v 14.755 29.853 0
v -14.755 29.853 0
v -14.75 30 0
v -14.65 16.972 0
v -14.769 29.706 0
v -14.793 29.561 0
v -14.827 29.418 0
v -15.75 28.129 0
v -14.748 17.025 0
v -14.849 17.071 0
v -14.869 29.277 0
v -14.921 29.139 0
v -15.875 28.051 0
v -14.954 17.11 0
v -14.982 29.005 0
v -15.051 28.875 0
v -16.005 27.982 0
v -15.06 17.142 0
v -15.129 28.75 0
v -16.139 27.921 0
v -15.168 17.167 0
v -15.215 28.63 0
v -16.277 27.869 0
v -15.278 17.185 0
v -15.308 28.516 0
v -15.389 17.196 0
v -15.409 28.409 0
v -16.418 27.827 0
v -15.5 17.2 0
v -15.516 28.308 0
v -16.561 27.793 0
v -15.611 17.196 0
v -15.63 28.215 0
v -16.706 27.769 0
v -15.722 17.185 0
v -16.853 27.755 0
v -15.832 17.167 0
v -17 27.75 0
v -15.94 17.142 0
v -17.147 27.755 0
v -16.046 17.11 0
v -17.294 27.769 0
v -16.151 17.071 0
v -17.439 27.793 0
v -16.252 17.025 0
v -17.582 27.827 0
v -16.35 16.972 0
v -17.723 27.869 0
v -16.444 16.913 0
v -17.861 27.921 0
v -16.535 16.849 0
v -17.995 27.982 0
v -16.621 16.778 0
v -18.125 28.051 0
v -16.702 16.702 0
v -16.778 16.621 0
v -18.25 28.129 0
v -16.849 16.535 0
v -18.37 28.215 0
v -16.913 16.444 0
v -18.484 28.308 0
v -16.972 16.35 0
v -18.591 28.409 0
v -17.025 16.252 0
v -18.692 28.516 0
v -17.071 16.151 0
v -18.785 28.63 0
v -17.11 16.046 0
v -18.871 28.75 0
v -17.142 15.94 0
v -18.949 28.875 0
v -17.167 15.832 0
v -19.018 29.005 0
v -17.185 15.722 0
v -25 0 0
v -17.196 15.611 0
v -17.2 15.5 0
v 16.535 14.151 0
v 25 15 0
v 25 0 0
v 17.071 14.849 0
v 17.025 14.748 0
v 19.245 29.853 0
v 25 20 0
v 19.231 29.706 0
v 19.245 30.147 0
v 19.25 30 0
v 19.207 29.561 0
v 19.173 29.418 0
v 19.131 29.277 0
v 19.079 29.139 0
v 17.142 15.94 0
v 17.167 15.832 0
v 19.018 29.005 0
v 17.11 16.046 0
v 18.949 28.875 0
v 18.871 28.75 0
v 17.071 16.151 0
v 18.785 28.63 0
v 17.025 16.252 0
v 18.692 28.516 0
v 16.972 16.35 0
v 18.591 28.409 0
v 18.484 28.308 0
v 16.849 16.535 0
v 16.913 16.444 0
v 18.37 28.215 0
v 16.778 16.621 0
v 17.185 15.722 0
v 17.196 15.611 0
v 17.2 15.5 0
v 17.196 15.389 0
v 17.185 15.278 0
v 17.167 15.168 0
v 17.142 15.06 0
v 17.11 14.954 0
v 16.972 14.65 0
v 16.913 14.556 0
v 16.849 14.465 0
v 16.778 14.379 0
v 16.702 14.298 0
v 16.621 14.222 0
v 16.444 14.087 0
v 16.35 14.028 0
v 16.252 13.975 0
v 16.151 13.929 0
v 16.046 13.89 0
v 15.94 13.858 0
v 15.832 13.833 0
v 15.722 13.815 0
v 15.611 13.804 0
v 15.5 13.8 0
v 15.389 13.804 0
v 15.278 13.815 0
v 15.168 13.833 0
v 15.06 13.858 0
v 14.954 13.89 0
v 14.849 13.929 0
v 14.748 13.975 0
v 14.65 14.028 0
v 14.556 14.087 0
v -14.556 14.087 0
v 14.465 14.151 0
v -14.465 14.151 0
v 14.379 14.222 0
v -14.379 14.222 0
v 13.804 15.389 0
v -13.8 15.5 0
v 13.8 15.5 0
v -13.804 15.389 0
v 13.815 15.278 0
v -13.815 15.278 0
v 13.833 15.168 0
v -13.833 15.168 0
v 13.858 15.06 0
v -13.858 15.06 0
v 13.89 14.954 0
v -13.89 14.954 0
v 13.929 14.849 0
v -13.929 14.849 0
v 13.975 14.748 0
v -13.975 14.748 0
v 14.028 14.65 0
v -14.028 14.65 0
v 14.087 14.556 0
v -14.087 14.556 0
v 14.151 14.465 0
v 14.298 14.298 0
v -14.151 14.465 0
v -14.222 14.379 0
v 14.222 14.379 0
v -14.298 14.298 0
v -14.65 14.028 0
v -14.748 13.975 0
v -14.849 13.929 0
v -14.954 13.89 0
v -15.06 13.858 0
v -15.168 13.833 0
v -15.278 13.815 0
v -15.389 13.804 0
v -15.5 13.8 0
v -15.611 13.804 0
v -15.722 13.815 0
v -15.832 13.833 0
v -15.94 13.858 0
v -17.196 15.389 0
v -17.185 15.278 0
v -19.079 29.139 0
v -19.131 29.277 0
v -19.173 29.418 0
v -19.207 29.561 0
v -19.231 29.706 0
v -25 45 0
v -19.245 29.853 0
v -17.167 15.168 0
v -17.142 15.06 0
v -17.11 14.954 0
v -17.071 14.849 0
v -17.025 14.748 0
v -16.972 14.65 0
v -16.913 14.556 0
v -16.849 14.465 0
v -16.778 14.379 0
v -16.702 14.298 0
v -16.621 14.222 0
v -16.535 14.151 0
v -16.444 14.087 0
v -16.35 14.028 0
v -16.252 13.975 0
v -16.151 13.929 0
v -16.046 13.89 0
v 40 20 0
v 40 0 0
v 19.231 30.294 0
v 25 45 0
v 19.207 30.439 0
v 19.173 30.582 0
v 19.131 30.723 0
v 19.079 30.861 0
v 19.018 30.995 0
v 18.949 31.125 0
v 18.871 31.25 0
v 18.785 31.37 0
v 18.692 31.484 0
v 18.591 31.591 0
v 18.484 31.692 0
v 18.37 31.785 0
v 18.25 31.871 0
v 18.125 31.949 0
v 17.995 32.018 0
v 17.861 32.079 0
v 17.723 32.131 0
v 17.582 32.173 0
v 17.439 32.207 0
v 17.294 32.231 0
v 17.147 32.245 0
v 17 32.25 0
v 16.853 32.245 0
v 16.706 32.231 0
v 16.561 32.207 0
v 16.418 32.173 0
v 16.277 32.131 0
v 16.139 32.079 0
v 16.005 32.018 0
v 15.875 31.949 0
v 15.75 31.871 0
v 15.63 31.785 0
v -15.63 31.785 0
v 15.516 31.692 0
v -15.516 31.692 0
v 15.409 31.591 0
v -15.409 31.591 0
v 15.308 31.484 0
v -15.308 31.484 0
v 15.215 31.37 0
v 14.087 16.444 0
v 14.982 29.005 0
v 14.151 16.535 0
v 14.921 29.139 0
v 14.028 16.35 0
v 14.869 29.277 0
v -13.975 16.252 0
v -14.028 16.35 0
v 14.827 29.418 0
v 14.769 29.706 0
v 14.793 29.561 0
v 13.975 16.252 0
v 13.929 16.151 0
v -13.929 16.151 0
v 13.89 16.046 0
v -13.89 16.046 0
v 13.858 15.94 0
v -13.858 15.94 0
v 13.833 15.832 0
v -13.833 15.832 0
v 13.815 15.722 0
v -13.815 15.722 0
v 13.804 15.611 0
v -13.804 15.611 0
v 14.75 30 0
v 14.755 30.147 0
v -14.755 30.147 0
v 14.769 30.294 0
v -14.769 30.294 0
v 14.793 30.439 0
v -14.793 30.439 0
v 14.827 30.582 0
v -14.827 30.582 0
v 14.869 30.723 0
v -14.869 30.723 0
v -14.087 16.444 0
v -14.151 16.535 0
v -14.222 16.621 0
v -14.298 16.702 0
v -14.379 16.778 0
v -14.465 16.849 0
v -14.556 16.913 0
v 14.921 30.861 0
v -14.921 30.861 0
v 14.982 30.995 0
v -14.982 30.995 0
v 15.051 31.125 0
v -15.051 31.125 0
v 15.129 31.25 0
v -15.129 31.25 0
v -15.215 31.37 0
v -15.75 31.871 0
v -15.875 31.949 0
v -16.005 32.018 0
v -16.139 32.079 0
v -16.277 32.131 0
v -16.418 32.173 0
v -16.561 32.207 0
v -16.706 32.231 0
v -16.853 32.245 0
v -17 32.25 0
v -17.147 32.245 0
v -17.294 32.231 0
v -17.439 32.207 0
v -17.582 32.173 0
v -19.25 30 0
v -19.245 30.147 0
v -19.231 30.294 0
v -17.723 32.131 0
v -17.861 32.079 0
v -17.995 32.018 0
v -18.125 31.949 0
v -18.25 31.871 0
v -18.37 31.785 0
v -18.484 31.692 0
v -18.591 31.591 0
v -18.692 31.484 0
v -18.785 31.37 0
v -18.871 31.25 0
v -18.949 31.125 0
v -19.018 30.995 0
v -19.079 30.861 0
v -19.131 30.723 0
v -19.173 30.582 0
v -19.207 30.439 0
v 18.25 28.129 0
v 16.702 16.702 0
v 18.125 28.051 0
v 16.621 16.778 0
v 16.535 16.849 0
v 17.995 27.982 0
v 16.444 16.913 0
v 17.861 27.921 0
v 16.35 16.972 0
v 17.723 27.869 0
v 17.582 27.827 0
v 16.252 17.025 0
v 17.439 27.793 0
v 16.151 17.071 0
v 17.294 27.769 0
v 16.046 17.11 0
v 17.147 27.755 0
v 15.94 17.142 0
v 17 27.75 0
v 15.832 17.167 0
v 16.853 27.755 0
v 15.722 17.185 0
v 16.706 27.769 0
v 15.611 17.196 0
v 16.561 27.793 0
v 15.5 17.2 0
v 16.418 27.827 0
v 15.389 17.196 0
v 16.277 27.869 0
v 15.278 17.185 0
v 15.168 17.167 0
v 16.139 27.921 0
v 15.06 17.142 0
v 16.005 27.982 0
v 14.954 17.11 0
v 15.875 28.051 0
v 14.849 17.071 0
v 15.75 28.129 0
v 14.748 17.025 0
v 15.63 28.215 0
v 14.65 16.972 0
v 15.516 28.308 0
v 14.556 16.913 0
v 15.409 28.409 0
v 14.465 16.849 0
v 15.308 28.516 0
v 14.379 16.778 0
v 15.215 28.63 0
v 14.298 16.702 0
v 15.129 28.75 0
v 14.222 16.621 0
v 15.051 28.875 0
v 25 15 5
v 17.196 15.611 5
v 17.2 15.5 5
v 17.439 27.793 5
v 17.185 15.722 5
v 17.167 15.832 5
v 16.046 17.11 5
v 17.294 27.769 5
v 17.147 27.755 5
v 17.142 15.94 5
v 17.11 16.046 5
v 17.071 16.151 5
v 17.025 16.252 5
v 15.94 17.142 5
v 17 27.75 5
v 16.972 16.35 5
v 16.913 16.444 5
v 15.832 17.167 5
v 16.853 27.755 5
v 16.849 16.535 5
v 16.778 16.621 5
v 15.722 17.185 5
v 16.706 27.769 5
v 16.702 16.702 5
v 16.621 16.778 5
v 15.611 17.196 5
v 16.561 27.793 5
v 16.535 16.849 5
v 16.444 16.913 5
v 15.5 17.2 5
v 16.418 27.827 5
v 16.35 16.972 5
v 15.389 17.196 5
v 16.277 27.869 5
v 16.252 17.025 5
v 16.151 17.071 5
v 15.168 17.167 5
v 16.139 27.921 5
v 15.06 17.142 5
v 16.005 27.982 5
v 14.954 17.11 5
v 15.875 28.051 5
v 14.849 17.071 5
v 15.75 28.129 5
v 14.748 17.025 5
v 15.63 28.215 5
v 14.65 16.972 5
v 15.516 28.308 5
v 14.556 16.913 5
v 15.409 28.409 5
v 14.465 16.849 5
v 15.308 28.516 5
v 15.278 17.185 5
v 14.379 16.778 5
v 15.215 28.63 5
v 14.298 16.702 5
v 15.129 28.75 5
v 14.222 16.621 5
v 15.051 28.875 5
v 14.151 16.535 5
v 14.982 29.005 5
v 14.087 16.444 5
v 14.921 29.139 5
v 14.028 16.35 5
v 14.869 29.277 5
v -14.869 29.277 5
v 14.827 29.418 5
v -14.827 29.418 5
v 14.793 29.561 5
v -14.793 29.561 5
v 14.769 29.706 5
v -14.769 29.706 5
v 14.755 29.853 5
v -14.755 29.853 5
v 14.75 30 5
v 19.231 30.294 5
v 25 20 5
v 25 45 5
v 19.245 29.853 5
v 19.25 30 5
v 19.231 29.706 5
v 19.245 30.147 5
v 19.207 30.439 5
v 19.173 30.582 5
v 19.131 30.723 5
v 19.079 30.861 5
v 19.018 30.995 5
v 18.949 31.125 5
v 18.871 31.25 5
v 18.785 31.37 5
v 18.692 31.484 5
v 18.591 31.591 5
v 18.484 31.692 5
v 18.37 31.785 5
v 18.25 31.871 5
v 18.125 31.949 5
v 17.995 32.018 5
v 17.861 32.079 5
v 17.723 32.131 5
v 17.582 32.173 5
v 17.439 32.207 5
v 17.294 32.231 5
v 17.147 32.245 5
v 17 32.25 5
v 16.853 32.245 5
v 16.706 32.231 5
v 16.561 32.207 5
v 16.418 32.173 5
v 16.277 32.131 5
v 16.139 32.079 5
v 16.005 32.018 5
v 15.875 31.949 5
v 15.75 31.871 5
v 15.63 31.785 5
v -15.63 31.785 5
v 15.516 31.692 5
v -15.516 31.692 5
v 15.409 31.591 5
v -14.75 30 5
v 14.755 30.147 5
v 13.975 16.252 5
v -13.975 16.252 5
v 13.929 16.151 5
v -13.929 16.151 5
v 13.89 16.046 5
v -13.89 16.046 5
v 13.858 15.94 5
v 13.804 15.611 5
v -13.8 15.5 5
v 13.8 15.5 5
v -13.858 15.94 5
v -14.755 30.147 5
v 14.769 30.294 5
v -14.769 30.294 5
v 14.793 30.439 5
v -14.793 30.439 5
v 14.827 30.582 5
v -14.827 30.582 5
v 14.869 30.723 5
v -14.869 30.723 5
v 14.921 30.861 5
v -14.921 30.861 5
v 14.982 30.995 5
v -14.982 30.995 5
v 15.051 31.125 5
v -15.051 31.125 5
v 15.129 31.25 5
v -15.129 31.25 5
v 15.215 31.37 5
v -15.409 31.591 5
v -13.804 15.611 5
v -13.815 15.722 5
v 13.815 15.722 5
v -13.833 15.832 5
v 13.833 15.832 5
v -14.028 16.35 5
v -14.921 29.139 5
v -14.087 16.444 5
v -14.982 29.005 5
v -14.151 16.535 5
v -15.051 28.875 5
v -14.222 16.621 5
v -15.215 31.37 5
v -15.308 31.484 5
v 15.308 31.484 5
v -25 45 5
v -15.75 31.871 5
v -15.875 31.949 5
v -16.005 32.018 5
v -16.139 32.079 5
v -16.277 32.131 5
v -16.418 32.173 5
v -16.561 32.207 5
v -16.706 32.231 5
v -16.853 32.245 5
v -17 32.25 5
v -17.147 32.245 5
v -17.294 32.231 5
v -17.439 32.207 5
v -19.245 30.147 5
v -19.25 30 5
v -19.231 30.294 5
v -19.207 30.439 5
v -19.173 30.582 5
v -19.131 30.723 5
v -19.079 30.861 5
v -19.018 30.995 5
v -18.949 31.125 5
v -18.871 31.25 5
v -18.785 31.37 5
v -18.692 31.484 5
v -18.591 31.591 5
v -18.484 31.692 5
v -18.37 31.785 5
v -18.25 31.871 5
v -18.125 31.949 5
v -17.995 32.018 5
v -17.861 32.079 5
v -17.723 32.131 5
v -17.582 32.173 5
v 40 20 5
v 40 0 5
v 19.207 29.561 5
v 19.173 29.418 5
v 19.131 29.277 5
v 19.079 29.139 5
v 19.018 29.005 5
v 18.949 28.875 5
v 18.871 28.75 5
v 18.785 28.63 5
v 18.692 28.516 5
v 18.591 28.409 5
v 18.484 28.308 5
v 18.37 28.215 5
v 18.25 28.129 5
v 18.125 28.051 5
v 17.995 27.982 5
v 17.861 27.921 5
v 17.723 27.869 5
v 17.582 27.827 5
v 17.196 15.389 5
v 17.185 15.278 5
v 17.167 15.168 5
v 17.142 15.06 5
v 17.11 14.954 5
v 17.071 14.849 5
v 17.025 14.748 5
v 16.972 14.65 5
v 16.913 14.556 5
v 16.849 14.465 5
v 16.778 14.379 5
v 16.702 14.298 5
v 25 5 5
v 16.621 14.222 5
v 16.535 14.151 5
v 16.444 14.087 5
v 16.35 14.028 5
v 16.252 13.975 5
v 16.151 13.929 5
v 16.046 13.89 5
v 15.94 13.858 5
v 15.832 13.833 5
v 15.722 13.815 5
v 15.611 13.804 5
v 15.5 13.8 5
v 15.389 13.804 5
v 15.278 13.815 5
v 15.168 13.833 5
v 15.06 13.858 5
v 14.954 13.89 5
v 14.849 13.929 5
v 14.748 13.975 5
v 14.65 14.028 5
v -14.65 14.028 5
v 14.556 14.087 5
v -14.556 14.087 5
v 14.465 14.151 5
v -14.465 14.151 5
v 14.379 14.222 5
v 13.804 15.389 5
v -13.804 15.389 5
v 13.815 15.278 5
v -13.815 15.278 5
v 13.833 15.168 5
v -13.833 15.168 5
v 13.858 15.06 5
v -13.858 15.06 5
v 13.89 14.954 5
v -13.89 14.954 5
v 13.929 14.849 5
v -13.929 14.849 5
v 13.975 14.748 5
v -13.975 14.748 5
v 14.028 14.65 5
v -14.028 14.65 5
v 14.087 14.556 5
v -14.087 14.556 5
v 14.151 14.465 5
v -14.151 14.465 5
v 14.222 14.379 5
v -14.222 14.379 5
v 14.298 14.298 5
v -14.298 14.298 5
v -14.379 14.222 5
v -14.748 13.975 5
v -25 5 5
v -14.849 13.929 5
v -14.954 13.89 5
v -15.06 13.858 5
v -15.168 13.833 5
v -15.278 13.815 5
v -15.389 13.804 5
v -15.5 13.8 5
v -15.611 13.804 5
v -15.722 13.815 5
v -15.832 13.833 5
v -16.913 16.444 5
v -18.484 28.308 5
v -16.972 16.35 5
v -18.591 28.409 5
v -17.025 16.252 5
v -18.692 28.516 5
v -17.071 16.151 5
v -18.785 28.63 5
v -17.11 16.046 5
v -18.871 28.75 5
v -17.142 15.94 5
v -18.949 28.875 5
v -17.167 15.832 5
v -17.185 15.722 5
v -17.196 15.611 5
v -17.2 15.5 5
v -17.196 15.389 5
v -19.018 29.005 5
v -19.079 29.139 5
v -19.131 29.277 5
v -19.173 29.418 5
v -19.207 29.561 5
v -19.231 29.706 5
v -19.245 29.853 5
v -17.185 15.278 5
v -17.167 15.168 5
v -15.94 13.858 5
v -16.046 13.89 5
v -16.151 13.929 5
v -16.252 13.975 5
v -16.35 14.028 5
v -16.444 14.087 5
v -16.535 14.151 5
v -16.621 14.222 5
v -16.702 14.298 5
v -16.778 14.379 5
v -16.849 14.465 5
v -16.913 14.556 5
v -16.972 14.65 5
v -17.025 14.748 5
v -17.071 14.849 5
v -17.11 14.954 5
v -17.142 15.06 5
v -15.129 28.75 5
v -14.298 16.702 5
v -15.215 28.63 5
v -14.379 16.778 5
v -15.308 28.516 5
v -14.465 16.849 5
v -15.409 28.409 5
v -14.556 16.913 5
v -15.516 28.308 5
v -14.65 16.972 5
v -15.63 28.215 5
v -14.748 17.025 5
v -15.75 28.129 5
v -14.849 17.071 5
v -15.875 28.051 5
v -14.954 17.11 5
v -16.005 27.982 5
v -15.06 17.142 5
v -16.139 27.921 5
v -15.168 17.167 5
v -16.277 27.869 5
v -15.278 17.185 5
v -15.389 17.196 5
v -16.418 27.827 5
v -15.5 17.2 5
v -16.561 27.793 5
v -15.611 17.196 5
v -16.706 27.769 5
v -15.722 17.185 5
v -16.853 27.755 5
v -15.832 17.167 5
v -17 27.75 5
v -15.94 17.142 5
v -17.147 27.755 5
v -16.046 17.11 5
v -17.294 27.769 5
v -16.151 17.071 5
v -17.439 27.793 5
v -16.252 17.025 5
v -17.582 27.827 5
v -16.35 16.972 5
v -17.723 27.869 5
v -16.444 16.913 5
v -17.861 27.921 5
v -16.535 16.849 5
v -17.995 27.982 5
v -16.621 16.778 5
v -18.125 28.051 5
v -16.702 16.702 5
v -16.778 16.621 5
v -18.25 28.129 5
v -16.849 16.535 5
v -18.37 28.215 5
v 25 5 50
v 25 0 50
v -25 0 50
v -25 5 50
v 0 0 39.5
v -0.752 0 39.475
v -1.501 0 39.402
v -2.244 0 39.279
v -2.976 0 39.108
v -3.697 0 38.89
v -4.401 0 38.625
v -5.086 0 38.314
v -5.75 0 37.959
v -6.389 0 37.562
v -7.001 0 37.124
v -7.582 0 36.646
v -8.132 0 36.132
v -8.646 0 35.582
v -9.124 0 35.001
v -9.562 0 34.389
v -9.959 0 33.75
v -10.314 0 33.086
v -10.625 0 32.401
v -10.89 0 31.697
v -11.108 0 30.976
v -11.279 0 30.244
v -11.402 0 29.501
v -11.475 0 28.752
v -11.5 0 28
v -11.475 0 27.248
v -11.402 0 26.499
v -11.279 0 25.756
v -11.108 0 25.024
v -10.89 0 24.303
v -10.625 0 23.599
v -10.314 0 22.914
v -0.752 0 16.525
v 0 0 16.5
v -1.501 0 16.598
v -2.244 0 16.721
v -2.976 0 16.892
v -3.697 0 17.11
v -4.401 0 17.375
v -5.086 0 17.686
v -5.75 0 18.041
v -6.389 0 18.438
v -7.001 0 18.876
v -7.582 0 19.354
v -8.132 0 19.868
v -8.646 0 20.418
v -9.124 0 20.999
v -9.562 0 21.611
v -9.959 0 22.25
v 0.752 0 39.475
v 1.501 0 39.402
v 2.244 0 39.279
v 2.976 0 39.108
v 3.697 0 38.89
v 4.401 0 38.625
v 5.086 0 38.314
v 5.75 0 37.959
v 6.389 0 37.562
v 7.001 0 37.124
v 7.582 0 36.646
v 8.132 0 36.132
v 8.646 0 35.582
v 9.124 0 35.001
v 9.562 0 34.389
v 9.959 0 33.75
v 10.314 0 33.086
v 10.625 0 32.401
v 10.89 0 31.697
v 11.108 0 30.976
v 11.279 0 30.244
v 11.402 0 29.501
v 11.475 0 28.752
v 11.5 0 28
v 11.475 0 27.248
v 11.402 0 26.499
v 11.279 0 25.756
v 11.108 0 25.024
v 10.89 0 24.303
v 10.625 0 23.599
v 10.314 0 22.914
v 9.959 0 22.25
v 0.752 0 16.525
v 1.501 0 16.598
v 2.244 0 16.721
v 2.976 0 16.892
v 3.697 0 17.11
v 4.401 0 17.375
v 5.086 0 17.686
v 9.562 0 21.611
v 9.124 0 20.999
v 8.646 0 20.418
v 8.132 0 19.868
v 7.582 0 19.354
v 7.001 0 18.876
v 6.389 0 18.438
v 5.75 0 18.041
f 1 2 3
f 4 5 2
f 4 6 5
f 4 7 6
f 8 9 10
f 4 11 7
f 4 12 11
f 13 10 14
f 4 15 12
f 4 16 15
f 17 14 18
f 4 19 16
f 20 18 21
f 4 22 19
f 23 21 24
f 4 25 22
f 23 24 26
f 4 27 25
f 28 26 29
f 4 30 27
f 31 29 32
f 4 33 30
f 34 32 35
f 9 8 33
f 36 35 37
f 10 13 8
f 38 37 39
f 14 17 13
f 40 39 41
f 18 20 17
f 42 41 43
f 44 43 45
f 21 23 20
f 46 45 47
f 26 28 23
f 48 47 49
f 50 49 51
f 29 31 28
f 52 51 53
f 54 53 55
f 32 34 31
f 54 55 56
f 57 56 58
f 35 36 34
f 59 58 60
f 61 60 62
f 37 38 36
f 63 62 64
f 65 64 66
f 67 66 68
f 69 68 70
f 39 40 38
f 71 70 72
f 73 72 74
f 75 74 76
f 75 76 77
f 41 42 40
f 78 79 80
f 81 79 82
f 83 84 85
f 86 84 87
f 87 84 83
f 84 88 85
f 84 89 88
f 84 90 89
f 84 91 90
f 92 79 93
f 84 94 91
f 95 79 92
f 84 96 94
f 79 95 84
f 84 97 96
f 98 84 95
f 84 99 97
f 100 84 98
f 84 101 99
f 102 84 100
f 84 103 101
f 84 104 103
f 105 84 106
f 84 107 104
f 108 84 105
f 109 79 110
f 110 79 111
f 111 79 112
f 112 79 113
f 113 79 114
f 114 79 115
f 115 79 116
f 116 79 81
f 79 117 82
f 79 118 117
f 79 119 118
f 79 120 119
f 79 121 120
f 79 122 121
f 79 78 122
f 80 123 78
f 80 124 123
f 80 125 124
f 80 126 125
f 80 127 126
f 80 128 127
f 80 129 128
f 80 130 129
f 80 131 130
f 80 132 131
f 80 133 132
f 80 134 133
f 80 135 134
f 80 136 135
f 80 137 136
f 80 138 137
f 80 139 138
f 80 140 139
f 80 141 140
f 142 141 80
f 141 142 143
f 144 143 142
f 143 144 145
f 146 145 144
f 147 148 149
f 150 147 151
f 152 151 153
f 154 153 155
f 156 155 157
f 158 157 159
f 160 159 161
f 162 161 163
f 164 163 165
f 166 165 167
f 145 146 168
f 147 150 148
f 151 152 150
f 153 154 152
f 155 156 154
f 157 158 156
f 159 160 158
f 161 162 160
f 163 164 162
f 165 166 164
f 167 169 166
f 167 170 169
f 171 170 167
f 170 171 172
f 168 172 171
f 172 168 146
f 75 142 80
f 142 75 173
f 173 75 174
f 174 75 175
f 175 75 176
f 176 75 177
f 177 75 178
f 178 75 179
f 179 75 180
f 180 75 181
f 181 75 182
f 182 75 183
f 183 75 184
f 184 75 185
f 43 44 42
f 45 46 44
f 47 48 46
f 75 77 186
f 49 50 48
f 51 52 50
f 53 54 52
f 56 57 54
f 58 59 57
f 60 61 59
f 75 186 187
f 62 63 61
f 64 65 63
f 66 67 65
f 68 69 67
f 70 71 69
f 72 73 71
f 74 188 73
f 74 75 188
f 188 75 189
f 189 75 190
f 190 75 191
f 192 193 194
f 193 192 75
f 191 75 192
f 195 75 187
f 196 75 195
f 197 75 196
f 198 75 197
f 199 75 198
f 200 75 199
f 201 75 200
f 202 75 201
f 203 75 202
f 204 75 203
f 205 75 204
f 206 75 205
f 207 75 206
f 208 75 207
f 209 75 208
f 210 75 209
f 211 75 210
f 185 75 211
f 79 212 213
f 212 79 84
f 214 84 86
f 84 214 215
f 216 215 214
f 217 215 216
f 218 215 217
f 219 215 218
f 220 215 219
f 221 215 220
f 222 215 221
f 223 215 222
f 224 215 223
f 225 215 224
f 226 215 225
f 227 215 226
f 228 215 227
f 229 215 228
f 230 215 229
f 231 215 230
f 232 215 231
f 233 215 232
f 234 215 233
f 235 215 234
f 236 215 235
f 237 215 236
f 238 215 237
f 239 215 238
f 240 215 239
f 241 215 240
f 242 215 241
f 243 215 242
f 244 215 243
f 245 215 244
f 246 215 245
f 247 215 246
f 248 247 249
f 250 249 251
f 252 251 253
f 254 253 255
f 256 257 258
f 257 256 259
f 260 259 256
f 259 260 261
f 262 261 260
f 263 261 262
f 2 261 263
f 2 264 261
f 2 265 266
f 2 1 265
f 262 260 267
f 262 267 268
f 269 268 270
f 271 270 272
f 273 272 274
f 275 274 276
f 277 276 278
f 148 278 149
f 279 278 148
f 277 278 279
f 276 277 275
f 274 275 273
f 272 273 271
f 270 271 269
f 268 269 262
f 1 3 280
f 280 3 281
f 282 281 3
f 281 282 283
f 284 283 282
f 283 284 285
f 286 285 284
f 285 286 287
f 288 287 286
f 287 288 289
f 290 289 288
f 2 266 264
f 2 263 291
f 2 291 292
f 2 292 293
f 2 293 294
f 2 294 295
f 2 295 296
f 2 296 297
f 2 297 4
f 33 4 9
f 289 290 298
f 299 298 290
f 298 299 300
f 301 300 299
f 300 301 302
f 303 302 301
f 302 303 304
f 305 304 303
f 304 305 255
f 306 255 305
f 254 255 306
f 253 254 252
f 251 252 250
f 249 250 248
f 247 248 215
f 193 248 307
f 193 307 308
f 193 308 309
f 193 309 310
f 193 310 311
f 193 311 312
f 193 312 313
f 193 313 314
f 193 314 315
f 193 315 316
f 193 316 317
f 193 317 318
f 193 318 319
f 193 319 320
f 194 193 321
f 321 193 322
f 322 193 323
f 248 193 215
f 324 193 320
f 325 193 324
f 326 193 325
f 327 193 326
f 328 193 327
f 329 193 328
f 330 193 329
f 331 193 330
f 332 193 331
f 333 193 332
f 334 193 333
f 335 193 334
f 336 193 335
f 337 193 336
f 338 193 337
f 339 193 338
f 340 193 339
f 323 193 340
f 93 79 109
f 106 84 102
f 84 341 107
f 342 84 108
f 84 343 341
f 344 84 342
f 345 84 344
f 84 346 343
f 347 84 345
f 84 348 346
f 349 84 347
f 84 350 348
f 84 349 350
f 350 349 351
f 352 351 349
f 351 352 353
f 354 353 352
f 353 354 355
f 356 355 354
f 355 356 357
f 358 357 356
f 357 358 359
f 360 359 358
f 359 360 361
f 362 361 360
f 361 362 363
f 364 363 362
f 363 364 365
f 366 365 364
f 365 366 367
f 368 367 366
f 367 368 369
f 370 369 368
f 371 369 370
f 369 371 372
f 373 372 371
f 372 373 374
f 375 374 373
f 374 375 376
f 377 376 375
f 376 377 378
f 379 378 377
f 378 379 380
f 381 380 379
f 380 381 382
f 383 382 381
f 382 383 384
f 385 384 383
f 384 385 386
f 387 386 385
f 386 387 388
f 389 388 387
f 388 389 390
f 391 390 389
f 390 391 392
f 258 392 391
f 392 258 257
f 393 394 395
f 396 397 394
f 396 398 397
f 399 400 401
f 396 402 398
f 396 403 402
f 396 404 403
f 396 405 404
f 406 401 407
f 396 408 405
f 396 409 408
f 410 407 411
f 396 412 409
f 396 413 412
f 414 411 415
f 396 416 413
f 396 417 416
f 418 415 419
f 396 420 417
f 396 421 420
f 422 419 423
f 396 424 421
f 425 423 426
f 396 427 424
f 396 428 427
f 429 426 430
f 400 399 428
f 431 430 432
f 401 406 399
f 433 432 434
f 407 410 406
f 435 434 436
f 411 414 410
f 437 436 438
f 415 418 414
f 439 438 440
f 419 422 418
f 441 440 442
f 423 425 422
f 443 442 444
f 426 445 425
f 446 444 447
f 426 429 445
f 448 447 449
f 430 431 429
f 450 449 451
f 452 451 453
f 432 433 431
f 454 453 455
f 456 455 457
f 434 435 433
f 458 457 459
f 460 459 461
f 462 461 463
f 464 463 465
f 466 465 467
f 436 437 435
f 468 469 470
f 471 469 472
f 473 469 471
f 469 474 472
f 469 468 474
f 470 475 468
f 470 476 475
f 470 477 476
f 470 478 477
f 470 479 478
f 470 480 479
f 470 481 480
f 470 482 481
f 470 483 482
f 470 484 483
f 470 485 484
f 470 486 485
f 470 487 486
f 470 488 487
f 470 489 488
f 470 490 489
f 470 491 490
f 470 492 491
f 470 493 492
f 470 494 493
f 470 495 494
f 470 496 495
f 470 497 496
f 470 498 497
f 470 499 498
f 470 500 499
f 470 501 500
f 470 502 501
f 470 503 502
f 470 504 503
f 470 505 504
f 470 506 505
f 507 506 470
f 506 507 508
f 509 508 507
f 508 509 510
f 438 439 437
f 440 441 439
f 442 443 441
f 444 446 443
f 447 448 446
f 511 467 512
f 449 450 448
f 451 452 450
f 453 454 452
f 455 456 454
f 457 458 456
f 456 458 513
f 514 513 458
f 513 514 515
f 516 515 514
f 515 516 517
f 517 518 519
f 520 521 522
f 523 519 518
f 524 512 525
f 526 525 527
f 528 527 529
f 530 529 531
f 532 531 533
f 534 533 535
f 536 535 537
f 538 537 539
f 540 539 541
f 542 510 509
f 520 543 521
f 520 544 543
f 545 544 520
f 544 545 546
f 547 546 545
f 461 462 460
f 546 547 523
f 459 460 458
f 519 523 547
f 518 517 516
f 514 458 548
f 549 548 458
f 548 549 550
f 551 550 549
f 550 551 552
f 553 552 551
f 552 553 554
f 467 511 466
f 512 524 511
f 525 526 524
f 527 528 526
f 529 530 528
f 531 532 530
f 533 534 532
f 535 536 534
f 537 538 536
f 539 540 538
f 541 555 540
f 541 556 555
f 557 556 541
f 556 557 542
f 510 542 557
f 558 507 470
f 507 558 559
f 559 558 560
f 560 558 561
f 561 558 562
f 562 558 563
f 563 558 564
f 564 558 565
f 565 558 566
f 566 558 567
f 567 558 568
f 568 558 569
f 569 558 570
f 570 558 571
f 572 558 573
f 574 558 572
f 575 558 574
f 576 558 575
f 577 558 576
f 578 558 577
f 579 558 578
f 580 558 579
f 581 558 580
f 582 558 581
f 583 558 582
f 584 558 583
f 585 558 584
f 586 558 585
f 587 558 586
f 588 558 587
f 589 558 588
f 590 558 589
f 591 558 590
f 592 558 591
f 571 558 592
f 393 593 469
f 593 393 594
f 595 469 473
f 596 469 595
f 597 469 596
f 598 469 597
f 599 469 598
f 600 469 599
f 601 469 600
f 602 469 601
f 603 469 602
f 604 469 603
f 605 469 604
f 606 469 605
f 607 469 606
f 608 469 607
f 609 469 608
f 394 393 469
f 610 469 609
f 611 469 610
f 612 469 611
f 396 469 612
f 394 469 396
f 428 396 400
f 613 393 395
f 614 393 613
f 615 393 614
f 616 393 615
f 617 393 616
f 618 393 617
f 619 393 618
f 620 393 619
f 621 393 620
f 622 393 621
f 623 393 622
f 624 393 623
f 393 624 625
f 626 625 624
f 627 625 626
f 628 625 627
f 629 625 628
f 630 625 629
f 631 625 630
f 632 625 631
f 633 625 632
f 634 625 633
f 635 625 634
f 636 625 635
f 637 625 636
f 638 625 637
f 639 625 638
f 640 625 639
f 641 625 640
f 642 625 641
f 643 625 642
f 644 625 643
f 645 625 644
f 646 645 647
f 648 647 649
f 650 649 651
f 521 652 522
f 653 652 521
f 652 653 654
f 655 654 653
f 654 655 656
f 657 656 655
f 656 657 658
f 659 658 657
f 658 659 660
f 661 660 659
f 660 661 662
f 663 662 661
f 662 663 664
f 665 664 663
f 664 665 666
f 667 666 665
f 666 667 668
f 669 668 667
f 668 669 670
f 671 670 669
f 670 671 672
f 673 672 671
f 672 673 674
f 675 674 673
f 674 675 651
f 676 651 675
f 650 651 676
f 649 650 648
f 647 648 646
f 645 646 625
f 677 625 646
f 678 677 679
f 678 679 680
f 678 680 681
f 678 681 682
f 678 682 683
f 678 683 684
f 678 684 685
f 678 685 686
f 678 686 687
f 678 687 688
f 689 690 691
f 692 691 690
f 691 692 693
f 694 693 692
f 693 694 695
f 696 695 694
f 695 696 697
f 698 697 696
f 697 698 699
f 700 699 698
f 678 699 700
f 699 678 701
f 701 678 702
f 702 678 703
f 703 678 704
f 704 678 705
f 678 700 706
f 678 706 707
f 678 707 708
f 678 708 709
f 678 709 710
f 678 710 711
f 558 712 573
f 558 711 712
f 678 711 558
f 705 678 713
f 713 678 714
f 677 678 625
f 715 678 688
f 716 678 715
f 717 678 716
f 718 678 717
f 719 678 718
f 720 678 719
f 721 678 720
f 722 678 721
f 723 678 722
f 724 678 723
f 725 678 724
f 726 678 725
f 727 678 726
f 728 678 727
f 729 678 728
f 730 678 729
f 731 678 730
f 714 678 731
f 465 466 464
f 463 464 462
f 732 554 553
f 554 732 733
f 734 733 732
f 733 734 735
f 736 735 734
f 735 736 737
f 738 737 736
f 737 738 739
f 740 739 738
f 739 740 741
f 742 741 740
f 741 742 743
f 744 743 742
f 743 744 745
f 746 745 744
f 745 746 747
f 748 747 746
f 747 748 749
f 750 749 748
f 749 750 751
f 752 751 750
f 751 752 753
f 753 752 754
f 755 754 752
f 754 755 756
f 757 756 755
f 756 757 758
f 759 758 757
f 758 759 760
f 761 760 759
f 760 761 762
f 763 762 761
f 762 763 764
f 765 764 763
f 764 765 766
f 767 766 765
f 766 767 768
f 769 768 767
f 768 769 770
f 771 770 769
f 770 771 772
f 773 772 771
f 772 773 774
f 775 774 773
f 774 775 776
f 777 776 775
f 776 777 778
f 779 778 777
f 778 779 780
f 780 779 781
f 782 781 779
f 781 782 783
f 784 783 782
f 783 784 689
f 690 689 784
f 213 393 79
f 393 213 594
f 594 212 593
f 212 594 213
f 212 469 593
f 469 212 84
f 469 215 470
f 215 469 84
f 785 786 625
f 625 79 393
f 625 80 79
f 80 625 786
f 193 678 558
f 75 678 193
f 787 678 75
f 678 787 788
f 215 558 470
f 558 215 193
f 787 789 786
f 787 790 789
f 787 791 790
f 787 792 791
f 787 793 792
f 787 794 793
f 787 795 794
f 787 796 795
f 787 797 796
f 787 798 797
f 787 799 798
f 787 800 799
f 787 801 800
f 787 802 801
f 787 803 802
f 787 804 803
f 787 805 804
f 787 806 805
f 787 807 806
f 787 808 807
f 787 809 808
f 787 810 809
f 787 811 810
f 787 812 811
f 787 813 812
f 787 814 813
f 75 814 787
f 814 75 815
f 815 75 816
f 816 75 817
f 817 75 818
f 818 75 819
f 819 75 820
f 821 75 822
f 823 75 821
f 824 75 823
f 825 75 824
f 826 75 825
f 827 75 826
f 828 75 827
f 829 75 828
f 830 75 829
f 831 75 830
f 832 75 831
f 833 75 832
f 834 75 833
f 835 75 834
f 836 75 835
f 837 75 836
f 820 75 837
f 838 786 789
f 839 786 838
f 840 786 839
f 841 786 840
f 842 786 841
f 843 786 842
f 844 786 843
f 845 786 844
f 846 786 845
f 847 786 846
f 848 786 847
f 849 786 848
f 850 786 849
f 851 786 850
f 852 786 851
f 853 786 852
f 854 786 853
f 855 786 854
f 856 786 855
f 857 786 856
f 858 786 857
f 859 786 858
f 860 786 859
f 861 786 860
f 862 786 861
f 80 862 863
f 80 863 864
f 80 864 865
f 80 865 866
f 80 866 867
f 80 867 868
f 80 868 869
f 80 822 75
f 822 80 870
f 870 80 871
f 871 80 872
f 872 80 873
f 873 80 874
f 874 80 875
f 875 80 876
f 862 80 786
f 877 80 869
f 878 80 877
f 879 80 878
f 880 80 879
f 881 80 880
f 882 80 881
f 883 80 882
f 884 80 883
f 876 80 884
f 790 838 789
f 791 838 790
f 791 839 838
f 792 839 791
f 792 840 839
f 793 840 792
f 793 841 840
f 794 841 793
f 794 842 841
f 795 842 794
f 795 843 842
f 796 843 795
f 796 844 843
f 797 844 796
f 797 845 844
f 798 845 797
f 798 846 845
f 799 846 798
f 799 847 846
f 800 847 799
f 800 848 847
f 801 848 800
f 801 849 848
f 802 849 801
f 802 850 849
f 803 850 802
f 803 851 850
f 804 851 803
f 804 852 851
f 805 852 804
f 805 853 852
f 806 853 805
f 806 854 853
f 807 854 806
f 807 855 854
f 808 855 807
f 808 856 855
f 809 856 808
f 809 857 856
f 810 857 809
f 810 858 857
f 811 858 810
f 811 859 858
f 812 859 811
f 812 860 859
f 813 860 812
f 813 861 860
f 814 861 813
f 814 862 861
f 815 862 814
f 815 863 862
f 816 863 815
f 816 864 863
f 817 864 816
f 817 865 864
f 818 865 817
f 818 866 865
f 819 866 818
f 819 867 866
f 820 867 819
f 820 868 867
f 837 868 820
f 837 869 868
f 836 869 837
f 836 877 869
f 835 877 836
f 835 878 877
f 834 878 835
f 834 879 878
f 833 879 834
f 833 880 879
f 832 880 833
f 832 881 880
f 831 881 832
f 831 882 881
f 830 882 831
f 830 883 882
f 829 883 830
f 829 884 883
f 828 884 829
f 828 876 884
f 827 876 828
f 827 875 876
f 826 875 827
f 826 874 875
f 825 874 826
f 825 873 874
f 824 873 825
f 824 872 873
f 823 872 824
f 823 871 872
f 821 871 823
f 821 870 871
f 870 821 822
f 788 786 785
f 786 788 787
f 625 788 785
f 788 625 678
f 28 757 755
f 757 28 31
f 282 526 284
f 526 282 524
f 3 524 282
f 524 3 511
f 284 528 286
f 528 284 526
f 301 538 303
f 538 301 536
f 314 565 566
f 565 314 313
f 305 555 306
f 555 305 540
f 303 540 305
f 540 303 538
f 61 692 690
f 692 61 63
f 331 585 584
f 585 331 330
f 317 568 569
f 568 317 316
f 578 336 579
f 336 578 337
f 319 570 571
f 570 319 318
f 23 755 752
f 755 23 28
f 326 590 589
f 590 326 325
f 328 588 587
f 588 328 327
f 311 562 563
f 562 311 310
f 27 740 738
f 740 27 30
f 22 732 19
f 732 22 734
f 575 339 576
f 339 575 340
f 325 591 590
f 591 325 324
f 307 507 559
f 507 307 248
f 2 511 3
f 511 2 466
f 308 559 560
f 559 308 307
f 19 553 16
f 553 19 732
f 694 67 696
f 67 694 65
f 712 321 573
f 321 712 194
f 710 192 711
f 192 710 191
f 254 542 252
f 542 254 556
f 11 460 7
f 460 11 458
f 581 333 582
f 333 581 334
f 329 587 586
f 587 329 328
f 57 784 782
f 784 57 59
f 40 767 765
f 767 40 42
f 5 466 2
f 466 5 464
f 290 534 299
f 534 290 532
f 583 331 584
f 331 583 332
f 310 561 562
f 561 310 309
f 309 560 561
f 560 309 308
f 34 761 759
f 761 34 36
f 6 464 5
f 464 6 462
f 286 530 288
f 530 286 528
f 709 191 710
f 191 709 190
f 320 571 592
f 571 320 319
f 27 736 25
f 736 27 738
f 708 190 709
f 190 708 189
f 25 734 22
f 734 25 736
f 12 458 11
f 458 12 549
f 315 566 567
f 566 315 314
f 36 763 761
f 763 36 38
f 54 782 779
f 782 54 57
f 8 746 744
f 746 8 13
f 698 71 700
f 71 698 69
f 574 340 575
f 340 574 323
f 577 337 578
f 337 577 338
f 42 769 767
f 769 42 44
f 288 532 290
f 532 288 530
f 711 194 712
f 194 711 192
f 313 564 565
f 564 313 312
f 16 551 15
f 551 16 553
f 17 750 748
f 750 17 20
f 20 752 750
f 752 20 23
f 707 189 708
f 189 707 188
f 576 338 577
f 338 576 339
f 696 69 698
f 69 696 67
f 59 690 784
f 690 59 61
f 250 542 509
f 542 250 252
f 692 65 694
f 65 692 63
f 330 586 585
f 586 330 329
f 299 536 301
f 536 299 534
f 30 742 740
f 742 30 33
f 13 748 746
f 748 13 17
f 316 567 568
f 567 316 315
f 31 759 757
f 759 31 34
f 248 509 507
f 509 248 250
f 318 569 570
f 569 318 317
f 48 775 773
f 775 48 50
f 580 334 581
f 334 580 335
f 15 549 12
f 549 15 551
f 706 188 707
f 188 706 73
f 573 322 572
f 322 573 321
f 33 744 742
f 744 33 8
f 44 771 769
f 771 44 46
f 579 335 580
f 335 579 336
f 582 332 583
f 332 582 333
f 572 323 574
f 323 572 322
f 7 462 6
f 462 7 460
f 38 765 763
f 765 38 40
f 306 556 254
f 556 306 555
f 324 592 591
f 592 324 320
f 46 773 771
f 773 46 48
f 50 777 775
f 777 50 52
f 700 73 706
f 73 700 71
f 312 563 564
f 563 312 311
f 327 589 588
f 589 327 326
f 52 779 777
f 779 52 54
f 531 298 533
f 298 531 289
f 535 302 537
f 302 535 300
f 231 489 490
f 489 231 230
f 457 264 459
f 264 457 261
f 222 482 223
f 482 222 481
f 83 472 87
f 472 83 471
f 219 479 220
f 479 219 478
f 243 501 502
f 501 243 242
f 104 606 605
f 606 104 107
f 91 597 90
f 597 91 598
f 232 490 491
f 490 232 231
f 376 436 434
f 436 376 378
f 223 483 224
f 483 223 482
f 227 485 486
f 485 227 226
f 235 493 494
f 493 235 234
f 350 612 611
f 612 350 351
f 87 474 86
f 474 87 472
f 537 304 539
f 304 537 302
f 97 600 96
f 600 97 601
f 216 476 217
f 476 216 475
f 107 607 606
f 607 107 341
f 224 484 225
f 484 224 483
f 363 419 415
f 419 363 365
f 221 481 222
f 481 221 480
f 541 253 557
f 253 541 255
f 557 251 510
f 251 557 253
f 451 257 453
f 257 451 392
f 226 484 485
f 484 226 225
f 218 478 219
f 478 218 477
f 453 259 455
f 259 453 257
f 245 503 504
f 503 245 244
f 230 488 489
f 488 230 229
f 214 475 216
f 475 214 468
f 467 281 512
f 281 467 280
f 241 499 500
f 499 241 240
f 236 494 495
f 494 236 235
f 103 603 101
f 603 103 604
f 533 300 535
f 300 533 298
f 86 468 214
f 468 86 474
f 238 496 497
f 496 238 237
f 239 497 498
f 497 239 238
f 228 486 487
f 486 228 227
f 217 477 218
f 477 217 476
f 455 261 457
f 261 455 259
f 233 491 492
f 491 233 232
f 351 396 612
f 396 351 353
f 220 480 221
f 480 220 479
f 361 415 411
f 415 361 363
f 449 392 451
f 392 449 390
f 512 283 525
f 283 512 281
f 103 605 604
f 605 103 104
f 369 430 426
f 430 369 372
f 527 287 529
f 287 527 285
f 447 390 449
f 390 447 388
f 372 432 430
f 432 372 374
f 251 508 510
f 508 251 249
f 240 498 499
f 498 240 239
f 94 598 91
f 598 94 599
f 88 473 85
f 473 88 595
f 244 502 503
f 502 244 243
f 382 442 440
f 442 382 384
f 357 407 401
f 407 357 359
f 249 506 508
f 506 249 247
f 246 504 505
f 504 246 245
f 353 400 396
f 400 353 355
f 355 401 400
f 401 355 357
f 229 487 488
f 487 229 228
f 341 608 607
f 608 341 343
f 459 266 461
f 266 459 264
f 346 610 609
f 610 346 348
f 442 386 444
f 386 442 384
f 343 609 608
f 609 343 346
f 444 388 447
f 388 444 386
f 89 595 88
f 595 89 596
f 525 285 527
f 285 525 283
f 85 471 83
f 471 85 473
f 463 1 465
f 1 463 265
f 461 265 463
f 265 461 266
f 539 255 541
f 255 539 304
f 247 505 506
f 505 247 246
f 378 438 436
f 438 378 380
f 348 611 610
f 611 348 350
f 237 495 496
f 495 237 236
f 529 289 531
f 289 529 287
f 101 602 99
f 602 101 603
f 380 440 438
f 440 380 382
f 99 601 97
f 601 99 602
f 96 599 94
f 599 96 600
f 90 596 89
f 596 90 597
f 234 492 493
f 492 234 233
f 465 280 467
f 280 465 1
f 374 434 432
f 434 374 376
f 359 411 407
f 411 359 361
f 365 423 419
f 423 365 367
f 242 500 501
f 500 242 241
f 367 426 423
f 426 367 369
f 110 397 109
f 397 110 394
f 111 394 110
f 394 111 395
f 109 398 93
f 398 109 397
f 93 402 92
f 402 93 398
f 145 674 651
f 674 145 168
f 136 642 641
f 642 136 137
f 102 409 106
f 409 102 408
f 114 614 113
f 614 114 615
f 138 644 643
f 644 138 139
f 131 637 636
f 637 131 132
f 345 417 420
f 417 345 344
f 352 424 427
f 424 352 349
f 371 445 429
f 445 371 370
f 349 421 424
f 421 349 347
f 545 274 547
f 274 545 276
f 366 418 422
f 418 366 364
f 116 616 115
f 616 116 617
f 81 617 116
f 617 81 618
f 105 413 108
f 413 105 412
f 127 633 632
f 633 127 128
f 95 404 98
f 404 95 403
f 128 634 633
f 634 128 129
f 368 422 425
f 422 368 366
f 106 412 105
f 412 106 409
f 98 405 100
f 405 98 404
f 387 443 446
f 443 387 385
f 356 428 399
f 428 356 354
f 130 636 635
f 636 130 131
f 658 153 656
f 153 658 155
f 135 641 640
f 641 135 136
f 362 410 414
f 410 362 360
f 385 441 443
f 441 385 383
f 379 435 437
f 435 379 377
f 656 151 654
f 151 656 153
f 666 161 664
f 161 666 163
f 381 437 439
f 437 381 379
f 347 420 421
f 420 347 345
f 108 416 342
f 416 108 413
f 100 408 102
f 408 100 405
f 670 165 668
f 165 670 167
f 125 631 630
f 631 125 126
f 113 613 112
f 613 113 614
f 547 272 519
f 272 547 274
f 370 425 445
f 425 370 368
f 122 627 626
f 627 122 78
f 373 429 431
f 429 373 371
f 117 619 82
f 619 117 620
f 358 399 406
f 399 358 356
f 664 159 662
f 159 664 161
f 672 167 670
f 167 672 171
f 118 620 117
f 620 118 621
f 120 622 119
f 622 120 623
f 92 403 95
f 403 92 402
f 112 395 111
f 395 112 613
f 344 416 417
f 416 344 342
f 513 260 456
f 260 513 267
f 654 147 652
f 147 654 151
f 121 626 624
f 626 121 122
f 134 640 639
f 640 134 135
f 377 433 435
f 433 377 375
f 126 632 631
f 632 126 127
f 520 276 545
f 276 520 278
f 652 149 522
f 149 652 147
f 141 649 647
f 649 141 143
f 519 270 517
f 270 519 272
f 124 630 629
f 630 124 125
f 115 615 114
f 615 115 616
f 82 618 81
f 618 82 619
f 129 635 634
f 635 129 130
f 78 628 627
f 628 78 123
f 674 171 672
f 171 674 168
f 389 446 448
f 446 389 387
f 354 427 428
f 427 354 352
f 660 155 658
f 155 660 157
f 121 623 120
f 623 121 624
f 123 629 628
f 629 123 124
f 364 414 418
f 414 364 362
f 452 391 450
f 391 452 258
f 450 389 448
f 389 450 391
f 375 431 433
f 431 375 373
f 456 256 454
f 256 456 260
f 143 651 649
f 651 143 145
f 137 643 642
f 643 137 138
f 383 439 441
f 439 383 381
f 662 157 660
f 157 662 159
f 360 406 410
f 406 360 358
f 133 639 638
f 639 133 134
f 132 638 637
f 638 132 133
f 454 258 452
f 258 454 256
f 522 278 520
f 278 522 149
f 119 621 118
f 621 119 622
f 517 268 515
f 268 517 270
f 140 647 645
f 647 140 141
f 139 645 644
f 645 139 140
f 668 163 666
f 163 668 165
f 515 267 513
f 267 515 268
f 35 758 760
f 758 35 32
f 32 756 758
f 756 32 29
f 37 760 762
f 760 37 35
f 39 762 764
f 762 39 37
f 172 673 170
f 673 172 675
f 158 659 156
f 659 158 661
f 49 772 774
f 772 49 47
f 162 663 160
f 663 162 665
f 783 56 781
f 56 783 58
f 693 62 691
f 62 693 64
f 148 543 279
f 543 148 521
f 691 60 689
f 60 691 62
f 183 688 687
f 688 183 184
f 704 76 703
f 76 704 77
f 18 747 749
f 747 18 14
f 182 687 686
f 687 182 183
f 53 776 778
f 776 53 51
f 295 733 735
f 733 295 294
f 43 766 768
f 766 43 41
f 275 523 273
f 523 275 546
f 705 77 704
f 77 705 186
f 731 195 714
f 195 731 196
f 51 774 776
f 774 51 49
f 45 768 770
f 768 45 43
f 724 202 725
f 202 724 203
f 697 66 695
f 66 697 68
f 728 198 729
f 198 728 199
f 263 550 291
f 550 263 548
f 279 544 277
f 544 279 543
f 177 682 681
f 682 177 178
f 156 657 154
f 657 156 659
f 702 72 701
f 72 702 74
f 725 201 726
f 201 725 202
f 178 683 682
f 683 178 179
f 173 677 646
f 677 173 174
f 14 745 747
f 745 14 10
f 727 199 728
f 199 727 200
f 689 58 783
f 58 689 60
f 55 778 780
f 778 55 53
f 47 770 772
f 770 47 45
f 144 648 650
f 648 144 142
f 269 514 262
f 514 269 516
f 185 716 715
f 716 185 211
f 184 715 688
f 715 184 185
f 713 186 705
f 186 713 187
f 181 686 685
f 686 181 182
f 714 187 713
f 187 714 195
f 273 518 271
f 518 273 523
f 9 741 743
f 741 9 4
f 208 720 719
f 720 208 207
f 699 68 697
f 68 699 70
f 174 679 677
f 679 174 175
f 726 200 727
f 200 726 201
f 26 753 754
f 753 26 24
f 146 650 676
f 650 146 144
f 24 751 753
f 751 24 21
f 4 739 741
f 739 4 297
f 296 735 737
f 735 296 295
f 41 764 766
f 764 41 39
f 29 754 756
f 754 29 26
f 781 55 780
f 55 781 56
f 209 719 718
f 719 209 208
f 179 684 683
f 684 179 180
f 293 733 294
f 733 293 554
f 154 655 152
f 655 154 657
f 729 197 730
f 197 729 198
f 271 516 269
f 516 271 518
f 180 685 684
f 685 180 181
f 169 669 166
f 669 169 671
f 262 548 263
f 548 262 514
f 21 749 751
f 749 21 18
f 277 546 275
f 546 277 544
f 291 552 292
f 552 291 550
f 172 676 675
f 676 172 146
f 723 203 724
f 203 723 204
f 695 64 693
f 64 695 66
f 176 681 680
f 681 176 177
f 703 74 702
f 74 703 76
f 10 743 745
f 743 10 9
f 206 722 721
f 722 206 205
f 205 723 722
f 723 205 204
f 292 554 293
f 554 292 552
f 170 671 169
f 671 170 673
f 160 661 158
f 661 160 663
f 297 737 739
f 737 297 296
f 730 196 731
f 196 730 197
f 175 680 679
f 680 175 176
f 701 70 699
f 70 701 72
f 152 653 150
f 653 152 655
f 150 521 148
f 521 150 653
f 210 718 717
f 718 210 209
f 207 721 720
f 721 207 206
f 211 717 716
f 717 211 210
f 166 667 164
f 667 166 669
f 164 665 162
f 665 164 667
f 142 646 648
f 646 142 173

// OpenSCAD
// L-shaped mounting bracket for NEMA 17 stepper motor
// Print orientation: base plate on bed, vertical plate builds upward (+Z)

// ---------------- Parameters ----------------
plate_w      = 50;    // base plate length (X)
plate_h      = 45;    // base plate width (Y)
plate_t      = 5;     // base plate thickness (Z)

hole_x       = 17;    // M4 through-hole X offset (±)
hole_y       = 30;    // M4 through-hole Y position
hole_d       = 4.5;   // M4 through-hole diameter

plate_v_w    = 50;    // vertical motor plate length (X)
plate_v_h    = 5;     // vertical motor plate width (Y)
plate_v_z    = 50;    // vertical motor plate height (Z)

boss_d       = 23;    // motor centring boss hole diameter
boss_x       = 0;     // boss hole X centre
boss_z       = 28;    // boss hole Z centre

screw_d      = 3.4;   // M3 screw hole diameter
screw_pitch  = 31;    // square pattern side length

gusset_t     = 5;     // gusset thickness (X)
gusset_leg   = 20;    // right-triangle leg length (Y and Z)
gusset_x     = 20;    // gusset attachment X position (20 to 25, 25 to 20)

eps          = 0.5;   // cutter overshoot past faces

$fn = 96;

// ---------------- Model ----------------
difference() {
    union() {
        // Base plate
        translate([-plate_w/2, 0, 0])
            cube([plate_w, plate_h, plate_t]);

        // Vertical motor plate
        translate([-plate_v_w/2, 0, 0])
            cube([plate_v_w, plate_v_h, plate_v_z]);

        // Gussets (right and left)
        for (sx = [-1, 1])
            translate([sx > 0 ? gusset_x : -gusset_x, 0, 0])
                linear_extrude(height = gusset_t)
                    polygon(points = [
                        [0, gusset_leg],
                        [gusset_leg, gusset_leg],
                        [gusset_leg, 0]
                    ]);
    }

    // M4 through-holes in base plate
    for (x = [-hole_x, hole_x])
        translate([x, hole_y, -eps])
            cylinder(d = hole_d, h = plate_t + 2*eps);

    // Motor boss hole through vertical plate (along Y)
    translate([boss_x, 0, boss_z])
        rotate([90, 0, 0])
            cylinder(d = boss_d, h = plate_v_h + 2*eps);

    // M3 screw holes on square pattern around boss hole
    for (a = [0, 90, 180, 270])
        rotate([0, 0, a])
            translate([screw_pitch/2, screw_pitch/2, 0])
                cylinder(d = screw_d, h = plate_v_z + 2*eps);
}
